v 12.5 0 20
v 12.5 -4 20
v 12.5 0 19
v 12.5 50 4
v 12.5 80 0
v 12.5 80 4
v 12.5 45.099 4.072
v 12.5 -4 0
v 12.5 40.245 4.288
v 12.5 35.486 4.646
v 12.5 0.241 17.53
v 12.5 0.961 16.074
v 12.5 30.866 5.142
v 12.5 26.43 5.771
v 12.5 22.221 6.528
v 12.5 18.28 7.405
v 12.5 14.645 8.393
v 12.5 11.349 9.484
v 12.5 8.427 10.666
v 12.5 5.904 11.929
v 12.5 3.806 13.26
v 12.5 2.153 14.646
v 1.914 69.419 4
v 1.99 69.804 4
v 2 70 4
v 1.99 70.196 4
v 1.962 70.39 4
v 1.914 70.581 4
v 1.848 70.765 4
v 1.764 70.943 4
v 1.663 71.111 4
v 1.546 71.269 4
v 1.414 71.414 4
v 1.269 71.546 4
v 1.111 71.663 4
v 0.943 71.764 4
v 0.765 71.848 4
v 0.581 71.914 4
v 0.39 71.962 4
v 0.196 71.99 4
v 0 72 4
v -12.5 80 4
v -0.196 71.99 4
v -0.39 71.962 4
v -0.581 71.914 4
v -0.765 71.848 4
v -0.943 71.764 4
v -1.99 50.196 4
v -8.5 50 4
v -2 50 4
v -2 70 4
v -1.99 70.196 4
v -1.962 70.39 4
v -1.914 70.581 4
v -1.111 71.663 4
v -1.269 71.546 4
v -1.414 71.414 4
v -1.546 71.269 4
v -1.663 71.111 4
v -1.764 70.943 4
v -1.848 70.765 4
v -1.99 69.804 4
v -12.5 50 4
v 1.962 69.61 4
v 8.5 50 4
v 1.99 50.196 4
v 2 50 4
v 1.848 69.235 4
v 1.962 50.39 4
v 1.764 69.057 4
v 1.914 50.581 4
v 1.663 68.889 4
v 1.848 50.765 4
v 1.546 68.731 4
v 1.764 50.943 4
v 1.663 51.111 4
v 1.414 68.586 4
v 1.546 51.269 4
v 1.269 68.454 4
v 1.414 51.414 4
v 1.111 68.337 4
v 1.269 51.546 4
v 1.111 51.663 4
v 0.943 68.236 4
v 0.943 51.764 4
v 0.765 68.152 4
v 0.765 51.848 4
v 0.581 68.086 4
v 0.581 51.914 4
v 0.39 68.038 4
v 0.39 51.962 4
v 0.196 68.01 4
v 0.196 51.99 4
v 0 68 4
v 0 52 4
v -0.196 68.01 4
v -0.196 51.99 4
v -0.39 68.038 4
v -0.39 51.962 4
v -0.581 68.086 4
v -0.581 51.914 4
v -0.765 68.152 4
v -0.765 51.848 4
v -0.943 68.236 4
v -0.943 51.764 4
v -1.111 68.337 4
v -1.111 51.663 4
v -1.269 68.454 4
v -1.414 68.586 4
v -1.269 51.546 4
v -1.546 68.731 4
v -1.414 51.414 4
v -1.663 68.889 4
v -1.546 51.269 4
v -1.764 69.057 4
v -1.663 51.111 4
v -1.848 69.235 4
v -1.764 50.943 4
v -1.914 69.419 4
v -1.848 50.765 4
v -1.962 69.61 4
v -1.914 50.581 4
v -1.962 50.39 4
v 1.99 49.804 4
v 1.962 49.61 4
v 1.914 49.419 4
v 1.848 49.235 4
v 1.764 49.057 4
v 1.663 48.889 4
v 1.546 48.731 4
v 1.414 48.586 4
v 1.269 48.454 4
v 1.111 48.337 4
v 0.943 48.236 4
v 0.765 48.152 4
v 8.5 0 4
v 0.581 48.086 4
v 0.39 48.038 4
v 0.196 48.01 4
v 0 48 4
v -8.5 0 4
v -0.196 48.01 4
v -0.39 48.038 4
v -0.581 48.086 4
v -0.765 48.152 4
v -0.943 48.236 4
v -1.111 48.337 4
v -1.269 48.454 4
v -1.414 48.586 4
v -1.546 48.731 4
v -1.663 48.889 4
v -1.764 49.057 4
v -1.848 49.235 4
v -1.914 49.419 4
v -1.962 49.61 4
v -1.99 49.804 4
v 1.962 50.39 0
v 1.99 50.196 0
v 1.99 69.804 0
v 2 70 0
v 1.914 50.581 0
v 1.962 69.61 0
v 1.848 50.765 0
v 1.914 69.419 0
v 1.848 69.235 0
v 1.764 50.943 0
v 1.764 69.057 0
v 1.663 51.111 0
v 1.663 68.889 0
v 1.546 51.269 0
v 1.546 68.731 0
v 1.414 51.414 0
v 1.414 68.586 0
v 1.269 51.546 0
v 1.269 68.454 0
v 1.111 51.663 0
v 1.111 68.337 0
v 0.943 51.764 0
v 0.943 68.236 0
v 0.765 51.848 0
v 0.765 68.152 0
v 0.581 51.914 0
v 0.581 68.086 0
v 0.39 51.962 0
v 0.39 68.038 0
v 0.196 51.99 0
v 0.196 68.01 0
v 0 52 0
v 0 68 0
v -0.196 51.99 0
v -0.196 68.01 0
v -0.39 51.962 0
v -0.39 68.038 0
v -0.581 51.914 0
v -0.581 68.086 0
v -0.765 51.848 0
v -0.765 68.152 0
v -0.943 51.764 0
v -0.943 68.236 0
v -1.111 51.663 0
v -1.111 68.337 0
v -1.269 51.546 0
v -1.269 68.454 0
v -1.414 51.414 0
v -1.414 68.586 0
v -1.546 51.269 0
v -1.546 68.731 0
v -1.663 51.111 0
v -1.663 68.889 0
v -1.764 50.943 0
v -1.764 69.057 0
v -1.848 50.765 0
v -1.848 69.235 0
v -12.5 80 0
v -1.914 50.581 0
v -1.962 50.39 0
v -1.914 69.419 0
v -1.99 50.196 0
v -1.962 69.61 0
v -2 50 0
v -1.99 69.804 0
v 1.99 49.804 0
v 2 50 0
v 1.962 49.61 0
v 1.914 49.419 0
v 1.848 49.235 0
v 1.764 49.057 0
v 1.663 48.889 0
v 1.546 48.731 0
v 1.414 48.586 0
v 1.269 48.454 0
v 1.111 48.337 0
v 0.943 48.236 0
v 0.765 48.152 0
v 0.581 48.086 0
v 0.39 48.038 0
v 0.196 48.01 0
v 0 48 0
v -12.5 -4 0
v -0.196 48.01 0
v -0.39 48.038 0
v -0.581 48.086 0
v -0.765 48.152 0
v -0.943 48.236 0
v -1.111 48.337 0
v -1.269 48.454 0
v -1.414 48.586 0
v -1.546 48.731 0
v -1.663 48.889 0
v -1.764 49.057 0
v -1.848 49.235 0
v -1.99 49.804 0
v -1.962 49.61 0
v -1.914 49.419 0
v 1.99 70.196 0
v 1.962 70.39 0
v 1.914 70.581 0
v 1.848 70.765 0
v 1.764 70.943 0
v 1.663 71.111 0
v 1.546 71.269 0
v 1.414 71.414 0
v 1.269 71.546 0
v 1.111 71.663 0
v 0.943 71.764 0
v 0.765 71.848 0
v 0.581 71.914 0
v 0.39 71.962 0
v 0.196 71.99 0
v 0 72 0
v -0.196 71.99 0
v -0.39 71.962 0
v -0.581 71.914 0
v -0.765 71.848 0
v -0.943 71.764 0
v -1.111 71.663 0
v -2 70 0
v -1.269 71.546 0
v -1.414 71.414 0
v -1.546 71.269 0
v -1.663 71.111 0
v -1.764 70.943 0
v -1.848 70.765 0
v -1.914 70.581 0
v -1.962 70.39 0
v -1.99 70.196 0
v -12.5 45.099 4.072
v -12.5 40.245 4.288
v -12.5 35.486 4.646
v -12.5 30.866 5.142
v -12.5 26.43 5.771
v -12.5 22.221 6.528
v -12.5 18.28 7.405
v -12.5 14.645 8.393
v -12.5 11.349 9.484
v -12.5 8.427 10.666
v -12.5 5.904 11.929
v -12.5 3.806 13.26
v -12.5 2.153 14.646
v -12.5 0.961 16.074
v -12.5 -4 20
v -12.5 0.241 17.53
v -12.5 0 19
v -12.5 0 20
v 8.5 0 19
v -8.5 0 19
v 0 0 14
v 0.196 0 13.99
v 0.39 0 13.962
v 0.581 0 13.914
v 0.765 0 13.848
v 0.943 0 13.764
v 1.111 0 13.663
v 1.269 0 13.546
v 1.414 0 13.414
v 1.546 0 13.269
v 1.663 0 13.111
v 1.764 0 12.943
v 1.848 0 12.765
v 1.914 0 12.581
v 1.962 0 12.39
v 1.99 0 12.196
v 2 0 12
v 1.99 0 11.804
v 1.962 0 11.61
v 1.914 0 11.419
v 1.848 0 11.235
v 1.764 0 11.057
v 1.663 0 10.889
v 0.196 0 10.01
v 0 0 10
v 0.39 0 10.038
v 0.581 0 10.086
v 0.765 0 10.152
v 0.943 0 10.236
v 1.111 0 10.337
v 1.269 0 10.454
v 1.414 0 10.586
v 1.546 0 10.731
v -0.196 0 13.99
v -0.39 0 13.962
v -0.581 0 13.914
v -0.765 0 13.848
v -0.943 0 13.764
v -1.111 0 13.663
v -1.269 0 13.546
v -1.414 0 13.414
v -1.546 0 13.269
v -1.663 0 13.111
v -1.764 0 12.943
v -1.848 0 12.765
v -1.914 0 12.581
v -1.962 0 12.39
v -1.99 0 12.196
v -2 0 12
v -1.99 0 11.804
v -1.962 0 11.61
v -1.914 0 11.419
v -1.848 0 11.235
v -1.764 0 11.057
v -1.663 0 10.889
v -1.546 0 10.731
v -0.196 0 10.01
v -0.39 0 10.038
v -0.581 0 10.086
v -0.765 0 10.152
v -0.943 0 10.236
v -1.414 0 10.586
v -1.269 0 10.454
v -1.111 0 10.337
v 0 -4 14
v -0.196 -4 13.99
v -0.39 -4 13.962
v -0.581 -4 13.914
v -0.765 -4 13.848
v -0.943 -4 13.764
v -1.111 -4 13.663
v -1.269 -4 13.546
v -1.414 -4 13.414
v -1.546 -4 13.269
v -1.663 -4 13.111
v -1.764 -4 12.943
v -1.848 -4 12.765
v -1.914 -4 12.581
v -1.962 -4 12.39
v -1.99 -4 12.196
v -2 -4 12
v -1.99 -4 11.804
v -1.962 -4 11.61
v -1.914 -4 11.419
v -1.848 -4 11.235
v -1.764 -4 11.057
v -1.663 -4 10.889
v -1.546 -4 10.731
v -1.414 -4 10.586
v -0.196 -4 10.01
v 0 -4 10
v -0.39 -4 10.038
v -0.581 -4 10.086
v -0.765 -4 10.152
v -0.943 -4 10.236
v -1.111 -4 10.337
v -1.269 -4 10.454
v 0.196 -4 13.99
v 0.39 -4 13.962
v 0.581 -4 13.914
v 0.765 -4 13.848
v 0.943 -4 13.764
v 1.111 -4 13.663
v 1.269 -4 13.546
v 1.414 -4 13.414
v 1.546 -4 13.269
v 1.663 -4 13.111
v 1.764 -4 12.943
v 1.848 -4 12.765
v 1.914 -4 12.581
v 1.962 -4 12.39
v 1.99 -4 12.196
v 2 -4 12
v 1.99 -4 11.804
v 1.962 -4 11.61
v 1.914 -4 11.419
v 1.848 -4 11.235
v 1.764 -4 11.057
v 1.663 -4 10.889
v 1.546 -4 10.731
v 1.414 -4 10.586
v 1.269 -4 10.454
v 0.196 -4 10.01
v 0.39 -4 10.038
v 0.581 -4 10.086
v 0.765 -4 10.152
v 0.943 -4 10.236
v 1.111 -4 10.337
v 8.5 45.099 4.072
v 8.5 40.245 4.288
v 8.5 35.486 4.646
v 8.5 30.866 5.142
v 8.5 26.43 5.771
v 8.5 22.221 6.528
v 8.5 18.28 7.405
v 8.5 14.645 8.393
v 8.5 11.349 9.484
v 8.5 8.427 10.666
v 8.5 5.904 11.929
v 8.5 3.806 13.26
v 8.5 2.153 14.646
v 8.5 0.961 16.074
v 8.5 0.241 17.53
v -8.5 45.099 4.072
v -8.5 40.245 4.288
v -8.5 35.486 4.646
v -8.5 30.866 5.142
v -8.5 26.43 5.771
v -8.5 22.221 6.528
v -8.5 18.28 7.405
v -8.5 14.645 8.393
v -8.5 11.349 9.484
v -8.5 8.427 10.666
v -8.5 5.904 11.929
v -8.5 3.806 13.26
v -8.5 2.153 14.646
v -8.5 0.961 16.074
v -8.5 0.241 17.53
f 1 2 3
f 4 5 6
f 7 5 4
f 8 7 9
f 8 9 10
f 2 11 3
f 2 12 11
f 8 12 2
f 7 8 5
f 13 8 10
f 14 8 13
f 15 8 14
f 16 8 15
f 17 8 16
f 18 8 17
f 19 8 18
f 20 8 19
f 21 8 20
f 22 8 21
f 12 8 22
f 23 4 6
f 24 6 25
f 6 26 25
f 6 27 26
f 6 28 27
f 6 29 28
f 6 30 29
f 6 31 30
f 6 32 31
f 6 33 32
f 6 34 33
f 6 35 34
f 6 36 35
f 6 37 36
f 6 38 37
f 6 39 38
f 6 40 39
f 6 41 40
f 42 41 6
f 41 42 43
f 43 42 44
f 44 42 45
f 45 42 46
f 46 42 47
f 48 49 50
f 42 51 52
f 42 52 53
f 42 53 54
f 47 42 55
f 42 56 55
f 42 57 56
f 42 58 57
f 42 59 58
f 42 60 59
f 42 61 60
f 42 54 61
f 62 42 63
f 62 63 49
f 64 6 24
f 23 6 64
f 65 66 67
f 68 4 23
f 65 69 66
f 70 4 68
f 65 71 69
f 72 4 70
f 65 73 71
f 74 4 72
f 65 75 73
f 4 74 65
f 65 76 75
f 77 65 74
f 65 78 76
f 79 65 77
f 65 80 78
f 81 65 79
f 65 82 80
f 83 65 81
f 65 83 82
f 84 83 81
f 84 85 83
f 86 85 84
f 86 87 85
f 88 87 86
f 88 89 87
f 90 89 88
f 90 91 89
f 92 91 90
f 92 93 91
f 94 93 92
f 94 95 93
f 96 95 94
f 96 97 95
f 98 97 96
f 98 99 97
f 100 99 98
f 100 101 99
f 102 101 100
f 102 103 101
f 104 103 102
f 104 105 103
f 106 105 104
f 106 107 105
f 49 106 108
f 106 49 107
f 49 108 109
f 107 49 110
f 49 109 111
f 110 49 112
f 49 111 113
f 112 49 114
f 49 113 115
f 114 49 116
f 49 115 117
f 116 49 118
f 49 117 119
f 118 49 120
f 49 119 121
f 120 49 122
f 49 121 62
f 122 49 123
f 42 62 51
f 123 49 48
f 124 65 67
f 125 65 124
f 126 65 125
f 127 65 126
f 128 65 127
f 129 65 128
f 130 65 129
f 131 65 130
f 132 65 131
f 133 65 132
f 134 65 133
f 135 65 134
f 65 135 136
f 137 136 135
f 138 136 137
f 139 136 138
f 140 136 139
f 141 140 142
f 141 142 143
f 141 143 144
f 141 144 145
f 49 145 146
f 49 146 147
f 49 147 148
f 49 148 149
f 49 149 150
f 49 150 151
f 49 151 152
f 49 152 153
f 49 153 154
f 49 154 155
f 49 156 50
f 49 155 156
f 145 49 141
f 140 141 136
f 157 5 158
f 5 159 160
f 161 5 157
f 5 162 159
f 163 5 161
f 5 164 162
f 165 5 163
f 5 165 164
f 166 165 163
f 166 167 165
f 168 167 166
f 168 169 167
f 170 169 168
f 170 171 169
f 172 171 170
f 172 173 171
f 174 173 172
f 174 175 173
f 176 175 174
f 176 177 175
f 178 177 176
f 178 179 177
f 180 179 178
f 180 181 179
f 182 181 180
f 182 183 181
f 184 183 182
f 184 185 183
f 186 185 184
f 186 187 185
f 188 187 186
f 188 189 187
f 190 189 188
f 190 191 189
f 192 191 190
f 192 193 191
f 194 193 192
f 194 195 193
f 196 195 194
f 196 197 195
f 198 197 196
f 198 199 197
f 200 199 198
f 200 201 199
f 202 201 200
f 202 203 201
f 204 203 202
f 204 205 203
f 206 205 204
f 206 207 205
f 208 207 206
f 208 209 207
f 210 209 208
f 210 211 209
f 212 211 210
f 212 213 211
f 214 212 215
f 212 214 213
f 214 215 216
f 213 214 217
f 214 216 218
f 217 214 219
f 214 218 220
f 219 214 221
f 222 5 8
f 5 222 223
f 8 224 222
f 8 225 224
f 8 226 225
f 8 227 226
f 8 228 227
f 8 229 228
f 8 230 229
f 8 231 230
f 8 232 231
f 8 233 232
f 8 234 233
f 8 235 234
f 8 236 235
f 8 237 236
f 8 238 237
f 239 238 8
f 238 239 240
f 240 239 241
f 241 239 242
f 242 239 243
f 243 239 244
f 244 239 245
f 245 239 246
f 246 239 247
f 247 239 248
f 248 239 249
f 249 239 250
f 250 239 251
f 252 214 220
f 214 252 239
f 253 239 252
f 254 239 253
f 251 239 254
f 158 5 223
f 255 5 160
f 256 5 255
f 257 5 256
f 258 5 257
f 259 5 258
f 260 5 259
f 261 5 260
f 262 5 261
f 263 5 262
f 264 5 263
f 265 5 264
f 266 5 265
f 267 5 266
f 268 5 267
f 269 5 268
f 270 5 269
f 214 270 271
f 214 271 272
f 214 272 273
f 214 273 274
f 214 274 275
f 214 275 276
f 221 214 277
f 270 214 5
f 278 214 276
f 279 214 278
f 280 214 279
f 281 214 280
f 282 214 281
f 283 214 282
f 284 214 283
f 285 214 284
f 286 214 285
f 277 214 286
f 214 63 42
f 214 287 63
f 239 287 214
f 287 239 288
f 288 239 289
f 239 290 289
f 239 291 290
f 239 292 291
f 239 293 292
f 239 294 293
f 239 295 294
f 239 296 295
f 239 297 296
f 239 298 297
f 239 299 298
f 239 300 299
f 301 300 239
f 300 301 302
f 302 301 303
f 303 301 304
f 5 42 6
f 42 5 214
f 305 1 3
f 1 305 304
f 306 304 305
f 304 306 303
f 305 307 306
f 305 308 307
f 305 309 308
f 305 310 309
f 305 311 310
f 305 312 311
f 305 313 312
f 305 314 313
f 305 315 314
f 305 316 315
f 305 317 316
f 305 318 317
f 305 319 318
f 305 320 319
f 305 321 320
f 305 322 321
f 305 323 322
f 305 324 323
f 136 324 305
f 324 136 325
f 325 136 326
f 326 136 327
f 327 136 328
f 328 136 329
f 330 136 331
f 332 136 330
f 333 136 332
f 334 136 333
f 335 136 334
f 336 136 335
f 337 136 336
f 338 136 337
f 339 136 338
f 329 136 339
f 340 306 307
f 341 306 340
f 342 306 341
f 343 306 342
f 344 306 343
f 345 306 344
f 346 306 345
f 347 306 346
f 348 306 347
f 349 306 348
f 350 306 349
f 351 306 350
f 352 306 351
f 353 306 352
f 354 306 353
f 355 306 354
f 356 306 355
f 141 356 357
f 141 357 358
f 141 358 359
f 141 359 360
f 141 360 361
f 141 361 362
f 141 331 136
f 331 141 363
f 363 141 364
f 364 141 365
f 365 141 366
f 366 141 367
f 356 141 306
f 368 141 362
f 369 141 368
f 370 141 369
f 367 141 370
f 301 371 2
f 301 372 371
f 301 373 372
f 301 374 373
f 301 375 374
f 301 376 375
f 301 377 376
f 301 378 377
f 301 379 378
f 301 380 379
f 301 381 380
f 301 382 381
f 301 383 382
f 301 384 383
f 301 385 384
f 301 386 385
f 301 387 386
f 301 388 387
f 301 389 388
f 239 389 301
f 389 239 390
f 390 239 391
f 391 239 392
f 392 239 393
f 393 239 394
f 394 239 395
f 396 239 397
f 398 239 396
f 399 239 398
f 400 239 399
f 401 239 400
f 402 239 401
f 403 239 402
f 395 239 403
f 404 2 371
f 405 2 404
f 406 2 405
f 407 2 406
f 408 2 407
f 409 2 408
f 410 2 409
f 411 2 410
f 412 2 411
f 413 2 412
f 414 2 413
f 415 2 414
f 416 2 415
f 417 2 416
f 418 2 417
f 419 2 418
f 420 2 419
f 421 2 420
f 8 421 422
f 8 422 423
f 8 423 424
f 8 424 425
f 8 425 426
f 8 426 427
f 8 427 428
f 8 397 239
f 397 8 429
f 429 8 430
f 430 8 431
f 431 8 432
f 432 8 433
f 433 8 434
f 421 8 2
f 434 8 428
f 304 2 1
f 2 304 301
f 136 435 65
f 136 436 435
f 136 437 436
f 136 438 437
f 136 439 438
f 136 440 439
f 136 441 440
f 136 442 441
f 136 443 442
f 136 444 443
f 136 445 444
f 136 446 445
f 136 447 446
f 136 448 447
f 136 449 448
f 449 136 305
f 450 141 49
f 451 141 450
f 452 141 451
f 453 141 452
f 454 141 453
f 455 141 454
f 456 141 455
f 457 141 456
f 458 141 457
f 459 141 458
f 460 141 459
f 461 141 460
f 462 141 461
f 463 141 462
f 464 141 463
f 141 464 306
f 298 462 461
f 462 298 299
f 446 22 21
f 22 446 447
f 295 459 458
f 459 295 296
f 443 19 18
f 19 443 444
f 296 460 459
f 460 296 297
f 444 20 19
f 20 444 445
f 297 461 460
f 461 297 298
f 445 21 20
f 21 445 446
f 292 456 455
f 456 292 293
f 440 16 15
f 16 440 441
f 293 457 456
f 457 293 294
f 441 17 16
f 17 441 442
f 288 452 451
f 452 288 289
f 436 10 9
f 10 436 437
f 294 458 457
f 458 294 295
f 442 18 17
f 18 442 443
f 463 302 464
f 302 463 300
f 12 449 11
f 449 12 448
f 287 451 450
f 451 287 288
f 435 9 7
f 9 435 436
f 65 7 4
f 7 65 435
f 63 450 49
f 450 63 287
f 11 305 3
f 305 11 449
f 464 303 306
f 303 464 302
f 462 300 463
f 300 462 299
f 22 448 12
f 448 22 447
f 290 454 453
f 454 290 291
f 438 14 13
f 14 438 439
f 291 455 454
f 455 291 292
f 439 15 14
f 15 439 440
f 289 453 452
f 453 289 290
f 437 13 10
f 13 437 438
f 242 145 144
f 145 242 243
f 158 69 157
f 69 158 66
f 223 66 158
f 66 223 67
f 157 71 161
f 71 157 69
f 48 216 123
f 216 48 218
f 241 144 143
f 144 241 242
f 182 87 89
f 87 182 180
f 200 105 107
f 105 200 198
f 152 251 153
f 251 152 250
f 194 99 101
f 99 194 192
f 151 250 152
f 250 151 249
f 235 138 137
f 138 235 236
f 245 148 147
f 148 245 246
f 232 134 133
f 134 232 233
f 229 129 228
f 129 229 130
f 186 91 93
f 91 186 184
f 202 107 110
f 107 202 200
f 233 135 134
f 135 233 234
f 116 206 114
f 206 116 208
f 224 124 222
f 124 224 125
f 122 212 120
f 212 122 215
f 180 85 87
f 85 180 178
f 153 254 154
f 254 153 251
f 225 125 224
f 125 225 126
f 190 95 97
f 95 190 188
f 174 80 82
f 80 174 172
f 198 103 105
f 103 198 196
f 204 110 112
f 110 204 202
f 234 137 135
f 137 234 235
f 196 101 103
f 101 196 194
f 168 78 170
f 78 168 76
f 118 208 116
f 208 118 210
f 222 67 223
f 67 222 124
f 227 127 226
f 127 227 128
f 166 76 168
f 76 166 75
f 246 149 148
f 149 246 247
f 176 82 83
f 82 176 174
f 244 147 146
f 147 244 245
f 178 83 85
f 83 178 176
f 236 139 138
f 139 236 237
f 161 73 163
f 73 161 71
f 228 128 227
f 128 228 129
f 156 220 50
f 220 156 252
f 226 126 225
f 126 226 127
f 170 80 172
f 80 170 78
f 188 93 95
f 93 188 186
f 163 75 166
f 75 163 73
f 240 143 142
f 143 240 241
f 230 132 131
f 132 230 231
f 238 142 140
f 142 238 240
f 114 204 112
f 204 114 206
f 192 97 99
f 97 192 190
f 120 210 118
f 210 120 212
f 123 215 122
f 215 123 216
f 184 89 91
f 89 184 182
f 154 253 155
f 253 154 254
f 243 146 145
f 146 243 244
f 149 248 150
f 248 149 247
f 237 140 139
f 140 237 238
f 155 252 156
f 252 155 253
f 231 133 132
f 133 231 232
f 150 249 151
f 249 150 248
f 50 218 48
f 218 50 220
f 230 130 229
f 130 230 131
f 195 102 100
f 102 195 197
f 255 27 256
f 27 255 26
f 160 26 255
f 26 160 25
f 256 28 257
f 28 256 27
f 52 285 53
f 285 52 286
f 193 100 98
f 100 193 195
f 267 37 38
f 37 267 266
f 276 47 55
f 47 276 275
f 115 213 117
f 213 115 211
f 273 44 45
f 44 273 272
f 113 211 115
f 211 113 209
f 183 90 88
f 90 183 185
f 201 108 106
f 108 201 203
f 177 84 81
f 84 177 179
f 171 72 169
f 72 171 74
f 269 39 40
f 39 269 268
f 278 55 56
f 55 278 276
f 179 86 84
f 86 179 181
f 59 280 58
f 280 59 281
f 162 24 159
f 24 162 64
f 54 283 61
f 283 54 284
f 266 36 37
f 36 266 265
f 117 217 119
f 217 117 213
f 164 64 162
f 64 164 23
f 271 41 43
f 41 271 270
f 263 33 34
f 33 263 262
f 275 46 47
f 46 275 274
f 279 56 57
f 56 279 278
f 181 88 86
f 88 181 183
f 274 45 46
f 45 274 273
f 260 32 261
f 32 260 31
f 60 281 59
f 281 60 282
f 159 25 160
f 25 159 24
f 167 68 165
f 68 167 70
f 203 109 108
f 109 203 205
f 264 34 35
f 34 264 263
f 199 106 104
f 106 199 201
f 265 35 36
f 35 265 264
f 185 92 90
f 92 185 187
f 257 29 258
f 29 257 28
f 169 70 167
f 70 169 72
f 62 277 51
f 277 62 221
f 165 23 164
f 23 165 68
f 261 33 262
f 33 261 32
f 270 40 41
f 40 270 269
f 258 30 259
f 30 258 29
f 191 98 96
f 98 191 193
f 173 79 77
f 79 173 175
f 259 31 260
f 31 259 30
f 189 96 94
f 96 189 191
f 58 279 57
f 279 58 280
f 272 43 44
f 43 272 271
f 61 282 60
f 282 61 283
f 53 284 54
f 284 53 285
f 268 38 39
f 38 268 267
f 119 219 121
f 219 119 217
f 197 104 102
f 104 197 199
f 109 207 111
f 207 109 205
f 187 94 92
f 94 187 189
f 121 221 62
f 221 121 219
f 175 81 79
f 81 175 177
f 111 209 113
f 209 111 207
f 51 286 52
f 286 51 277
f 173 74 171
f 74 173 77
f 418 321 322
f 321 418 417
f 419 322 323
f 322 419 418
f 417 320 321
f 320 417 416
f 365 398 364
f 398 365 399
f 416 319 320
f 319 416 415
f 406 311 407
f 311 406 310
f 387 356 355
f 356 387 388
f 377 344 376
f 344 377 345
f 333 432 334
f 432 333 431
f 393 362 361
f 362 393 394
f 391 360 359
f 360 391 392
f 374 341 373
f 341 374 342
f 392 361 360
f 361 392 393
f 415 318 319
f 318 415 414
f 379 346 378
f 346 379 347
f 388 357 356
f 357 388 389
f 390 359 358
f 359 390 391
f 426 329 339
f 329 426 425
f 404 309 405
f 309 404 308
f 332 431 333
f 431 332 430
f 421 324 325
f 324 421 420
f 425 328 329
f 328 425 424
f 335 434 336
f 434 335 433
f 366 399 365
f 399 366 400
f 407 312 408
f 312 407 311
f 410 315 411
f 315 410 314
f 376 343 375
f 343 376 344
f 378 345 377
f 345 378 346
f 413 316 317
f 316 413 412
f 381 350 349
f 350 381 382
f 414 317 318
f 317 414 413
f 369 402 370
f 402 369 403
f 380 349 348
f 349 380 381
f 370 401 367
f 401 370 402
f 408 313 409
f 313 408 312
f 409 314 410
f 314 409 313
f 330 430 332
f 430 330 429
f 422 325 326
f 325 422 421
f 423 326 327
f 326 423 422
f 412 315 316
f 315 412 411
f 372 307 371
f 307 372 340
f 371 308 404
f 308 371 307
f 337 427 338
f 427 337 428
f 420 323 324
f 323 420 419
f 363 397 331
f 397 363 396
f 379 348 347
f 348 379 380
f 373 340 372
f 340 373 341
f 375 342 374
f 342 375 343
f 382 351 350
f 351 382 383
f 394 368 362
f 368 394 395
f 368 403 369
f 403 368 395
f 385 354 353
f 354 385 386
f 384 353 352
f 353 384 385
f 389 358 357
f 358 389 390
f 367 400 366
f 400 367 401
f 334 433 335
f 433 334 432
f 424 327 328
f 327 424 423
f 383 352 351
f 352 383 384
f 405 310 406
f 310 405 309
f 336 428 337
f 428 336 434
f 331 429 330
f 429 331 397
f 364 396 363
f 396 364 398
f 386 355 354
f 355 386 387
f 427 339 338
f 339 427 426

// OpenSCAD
$fn = 64;

THICK = 4;
WIDTH = 25;
HEIGHT = 20;
LENGTH = 80;
SIDE_L = 50;
SIDE_H = 15;

HOLE_D = 4;
HOLE_L1 = 50;
HOLE_L2 = 70;
HOLE_H = 12;

module wardrobe_fix() {
    difference() {
        union() {
            translate([0, LENGTH / 2, THICK / 2]) cube([WIDTH, LENGTH, THICK], center=true);
            rotate([90, 0, 0]) translate([0, HEIGHT / 2, THICK / 2]) cube([WIDTH, HEIGHT, THICK], center=true);
            translate([+(WIDTH - THICK) / 2, SIDE_L / 2, THICK + (SIDE_H / 2)]) cube([THICK, SIDE_L, SIDE_H], center=true);
            translate([-(WIDTH - THICK) / 2, SIDE_L / 2, THICK + (SIDE_H / 2)]) cube([THICK, SIDE_L, SIDE_H], center=true);
        }
        union() {
            translate([0, 0, SIDE_H + THICK]) rotate([0, 90, 0]) translate([0, SIDE_L, 0]) scale([SIDE_H, SIDE_L, 1])  cylinder(r=1, h=HEIGHT + 100, center=true);
            translate([0, HOLE_L1, 0]) cylinder(r=HOLE_D/2, h=HEIGHT + 100, center=true);
            translate([0, HOLE_L2, 0]) cylinder(r=HOLE_D/2, h=HEIGHT + 100, center=true);
            translate([0, 0, HOLE_H]) rotate([90, 0, 0]) cylinder(r=HOLE_D/2, h=HEIGHT + 100, center=true);
        }
    }
}

wardrobe_fix();
